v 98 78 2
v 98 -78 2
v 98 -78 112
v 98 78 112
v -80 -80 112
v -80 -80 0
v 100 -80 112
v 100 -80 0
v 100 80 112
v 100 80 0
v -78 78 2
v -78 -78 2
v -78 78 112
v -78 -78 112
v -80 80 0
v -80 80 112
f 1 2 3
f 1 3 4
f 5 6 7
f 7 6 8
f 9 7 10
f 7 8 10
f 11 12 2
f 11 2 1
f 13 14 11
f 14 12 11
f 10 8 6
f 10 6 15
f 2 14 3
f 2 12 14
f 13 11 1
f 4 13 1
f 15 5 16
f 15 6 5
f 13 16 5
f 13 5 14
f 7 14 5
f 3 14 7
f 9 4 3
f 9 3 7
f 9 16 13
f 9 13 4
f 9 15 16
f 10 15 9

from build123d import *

# Parameters (mm, degrees)
SKETCH2_W           = 160
SKETCH2_H           = 160
BOSS_EXTRUDE1_DEPTH = 2
SKETCH4_W           = 2
SKETCH4_H           = 160
BOSS_EXTRUDE3_DEPTH = 20
SKETCH5_W           = 180
SKETCH5_H           = 160
SKETCH5_W_2         = 176
SKETCH5_H_2         = 156
BOSS_EXTRUDE5_DEPTH = 100
SKETCH6_W           = 180
SKETCH6_H           = 160
SKETCH6_W_2         = 176
SKETCH6_H_2         = 156
BOSS_EXTRUDE6_DEPTH = 10


with BuildPart() as part:
    # Sketch2 → Boss-Extrude1 (new body)
    with BuildSketch(Plane.XY):
        Rectangle(SKETCH2_W, SKETCH2_H)
    extrude(amount=BOSS_EXTRUDE1_DEPTH)

    # Sketch4 → Boss-Extrude3 (add)
    with BuildSketch(Plane(origin=(80, 0, 0), x_dir=(0, 0, -1), z_dir=(1, 0, 0))):
        with Locations((-1, 0)):
            Rectangle(SKETCH4_W, SKETCH4_H)
    extrude(amount=BOSS_EXTRUDE3_DEPTH)

    # Sketch5 → Boss-Extrude5 (add)
    with BuildSketch(Plane.XY.offset(2)):
        with Locations((10, 0)):
            Rectangle(SKETCH5_W, SKETCH5_H)
        with Locations((10, 0)):
            Rectangle(SKETCH5_W_2, SKETCH5_H_2, mode=Mode.SUBTRACT)
    extrude(amount=BOSS_EXTRUDE5_DEPTH)

    # Sketch6 → Boss-Extrude6 (add)
    with BuildSketch(Plane.XY.offset(102)):
        with Locations((10, 0)):
            Rectangle(SKETCH6_W, SKETCH6_H)
        with Locations((10, 0)):
            Rectangle(SKETCH6_W_2, SKETCH6_H_2, mode=Mode.SUBTRACT)
    extrude(amount=BOSS_EXTRUDE6_DEPTH)


solid = part.part
